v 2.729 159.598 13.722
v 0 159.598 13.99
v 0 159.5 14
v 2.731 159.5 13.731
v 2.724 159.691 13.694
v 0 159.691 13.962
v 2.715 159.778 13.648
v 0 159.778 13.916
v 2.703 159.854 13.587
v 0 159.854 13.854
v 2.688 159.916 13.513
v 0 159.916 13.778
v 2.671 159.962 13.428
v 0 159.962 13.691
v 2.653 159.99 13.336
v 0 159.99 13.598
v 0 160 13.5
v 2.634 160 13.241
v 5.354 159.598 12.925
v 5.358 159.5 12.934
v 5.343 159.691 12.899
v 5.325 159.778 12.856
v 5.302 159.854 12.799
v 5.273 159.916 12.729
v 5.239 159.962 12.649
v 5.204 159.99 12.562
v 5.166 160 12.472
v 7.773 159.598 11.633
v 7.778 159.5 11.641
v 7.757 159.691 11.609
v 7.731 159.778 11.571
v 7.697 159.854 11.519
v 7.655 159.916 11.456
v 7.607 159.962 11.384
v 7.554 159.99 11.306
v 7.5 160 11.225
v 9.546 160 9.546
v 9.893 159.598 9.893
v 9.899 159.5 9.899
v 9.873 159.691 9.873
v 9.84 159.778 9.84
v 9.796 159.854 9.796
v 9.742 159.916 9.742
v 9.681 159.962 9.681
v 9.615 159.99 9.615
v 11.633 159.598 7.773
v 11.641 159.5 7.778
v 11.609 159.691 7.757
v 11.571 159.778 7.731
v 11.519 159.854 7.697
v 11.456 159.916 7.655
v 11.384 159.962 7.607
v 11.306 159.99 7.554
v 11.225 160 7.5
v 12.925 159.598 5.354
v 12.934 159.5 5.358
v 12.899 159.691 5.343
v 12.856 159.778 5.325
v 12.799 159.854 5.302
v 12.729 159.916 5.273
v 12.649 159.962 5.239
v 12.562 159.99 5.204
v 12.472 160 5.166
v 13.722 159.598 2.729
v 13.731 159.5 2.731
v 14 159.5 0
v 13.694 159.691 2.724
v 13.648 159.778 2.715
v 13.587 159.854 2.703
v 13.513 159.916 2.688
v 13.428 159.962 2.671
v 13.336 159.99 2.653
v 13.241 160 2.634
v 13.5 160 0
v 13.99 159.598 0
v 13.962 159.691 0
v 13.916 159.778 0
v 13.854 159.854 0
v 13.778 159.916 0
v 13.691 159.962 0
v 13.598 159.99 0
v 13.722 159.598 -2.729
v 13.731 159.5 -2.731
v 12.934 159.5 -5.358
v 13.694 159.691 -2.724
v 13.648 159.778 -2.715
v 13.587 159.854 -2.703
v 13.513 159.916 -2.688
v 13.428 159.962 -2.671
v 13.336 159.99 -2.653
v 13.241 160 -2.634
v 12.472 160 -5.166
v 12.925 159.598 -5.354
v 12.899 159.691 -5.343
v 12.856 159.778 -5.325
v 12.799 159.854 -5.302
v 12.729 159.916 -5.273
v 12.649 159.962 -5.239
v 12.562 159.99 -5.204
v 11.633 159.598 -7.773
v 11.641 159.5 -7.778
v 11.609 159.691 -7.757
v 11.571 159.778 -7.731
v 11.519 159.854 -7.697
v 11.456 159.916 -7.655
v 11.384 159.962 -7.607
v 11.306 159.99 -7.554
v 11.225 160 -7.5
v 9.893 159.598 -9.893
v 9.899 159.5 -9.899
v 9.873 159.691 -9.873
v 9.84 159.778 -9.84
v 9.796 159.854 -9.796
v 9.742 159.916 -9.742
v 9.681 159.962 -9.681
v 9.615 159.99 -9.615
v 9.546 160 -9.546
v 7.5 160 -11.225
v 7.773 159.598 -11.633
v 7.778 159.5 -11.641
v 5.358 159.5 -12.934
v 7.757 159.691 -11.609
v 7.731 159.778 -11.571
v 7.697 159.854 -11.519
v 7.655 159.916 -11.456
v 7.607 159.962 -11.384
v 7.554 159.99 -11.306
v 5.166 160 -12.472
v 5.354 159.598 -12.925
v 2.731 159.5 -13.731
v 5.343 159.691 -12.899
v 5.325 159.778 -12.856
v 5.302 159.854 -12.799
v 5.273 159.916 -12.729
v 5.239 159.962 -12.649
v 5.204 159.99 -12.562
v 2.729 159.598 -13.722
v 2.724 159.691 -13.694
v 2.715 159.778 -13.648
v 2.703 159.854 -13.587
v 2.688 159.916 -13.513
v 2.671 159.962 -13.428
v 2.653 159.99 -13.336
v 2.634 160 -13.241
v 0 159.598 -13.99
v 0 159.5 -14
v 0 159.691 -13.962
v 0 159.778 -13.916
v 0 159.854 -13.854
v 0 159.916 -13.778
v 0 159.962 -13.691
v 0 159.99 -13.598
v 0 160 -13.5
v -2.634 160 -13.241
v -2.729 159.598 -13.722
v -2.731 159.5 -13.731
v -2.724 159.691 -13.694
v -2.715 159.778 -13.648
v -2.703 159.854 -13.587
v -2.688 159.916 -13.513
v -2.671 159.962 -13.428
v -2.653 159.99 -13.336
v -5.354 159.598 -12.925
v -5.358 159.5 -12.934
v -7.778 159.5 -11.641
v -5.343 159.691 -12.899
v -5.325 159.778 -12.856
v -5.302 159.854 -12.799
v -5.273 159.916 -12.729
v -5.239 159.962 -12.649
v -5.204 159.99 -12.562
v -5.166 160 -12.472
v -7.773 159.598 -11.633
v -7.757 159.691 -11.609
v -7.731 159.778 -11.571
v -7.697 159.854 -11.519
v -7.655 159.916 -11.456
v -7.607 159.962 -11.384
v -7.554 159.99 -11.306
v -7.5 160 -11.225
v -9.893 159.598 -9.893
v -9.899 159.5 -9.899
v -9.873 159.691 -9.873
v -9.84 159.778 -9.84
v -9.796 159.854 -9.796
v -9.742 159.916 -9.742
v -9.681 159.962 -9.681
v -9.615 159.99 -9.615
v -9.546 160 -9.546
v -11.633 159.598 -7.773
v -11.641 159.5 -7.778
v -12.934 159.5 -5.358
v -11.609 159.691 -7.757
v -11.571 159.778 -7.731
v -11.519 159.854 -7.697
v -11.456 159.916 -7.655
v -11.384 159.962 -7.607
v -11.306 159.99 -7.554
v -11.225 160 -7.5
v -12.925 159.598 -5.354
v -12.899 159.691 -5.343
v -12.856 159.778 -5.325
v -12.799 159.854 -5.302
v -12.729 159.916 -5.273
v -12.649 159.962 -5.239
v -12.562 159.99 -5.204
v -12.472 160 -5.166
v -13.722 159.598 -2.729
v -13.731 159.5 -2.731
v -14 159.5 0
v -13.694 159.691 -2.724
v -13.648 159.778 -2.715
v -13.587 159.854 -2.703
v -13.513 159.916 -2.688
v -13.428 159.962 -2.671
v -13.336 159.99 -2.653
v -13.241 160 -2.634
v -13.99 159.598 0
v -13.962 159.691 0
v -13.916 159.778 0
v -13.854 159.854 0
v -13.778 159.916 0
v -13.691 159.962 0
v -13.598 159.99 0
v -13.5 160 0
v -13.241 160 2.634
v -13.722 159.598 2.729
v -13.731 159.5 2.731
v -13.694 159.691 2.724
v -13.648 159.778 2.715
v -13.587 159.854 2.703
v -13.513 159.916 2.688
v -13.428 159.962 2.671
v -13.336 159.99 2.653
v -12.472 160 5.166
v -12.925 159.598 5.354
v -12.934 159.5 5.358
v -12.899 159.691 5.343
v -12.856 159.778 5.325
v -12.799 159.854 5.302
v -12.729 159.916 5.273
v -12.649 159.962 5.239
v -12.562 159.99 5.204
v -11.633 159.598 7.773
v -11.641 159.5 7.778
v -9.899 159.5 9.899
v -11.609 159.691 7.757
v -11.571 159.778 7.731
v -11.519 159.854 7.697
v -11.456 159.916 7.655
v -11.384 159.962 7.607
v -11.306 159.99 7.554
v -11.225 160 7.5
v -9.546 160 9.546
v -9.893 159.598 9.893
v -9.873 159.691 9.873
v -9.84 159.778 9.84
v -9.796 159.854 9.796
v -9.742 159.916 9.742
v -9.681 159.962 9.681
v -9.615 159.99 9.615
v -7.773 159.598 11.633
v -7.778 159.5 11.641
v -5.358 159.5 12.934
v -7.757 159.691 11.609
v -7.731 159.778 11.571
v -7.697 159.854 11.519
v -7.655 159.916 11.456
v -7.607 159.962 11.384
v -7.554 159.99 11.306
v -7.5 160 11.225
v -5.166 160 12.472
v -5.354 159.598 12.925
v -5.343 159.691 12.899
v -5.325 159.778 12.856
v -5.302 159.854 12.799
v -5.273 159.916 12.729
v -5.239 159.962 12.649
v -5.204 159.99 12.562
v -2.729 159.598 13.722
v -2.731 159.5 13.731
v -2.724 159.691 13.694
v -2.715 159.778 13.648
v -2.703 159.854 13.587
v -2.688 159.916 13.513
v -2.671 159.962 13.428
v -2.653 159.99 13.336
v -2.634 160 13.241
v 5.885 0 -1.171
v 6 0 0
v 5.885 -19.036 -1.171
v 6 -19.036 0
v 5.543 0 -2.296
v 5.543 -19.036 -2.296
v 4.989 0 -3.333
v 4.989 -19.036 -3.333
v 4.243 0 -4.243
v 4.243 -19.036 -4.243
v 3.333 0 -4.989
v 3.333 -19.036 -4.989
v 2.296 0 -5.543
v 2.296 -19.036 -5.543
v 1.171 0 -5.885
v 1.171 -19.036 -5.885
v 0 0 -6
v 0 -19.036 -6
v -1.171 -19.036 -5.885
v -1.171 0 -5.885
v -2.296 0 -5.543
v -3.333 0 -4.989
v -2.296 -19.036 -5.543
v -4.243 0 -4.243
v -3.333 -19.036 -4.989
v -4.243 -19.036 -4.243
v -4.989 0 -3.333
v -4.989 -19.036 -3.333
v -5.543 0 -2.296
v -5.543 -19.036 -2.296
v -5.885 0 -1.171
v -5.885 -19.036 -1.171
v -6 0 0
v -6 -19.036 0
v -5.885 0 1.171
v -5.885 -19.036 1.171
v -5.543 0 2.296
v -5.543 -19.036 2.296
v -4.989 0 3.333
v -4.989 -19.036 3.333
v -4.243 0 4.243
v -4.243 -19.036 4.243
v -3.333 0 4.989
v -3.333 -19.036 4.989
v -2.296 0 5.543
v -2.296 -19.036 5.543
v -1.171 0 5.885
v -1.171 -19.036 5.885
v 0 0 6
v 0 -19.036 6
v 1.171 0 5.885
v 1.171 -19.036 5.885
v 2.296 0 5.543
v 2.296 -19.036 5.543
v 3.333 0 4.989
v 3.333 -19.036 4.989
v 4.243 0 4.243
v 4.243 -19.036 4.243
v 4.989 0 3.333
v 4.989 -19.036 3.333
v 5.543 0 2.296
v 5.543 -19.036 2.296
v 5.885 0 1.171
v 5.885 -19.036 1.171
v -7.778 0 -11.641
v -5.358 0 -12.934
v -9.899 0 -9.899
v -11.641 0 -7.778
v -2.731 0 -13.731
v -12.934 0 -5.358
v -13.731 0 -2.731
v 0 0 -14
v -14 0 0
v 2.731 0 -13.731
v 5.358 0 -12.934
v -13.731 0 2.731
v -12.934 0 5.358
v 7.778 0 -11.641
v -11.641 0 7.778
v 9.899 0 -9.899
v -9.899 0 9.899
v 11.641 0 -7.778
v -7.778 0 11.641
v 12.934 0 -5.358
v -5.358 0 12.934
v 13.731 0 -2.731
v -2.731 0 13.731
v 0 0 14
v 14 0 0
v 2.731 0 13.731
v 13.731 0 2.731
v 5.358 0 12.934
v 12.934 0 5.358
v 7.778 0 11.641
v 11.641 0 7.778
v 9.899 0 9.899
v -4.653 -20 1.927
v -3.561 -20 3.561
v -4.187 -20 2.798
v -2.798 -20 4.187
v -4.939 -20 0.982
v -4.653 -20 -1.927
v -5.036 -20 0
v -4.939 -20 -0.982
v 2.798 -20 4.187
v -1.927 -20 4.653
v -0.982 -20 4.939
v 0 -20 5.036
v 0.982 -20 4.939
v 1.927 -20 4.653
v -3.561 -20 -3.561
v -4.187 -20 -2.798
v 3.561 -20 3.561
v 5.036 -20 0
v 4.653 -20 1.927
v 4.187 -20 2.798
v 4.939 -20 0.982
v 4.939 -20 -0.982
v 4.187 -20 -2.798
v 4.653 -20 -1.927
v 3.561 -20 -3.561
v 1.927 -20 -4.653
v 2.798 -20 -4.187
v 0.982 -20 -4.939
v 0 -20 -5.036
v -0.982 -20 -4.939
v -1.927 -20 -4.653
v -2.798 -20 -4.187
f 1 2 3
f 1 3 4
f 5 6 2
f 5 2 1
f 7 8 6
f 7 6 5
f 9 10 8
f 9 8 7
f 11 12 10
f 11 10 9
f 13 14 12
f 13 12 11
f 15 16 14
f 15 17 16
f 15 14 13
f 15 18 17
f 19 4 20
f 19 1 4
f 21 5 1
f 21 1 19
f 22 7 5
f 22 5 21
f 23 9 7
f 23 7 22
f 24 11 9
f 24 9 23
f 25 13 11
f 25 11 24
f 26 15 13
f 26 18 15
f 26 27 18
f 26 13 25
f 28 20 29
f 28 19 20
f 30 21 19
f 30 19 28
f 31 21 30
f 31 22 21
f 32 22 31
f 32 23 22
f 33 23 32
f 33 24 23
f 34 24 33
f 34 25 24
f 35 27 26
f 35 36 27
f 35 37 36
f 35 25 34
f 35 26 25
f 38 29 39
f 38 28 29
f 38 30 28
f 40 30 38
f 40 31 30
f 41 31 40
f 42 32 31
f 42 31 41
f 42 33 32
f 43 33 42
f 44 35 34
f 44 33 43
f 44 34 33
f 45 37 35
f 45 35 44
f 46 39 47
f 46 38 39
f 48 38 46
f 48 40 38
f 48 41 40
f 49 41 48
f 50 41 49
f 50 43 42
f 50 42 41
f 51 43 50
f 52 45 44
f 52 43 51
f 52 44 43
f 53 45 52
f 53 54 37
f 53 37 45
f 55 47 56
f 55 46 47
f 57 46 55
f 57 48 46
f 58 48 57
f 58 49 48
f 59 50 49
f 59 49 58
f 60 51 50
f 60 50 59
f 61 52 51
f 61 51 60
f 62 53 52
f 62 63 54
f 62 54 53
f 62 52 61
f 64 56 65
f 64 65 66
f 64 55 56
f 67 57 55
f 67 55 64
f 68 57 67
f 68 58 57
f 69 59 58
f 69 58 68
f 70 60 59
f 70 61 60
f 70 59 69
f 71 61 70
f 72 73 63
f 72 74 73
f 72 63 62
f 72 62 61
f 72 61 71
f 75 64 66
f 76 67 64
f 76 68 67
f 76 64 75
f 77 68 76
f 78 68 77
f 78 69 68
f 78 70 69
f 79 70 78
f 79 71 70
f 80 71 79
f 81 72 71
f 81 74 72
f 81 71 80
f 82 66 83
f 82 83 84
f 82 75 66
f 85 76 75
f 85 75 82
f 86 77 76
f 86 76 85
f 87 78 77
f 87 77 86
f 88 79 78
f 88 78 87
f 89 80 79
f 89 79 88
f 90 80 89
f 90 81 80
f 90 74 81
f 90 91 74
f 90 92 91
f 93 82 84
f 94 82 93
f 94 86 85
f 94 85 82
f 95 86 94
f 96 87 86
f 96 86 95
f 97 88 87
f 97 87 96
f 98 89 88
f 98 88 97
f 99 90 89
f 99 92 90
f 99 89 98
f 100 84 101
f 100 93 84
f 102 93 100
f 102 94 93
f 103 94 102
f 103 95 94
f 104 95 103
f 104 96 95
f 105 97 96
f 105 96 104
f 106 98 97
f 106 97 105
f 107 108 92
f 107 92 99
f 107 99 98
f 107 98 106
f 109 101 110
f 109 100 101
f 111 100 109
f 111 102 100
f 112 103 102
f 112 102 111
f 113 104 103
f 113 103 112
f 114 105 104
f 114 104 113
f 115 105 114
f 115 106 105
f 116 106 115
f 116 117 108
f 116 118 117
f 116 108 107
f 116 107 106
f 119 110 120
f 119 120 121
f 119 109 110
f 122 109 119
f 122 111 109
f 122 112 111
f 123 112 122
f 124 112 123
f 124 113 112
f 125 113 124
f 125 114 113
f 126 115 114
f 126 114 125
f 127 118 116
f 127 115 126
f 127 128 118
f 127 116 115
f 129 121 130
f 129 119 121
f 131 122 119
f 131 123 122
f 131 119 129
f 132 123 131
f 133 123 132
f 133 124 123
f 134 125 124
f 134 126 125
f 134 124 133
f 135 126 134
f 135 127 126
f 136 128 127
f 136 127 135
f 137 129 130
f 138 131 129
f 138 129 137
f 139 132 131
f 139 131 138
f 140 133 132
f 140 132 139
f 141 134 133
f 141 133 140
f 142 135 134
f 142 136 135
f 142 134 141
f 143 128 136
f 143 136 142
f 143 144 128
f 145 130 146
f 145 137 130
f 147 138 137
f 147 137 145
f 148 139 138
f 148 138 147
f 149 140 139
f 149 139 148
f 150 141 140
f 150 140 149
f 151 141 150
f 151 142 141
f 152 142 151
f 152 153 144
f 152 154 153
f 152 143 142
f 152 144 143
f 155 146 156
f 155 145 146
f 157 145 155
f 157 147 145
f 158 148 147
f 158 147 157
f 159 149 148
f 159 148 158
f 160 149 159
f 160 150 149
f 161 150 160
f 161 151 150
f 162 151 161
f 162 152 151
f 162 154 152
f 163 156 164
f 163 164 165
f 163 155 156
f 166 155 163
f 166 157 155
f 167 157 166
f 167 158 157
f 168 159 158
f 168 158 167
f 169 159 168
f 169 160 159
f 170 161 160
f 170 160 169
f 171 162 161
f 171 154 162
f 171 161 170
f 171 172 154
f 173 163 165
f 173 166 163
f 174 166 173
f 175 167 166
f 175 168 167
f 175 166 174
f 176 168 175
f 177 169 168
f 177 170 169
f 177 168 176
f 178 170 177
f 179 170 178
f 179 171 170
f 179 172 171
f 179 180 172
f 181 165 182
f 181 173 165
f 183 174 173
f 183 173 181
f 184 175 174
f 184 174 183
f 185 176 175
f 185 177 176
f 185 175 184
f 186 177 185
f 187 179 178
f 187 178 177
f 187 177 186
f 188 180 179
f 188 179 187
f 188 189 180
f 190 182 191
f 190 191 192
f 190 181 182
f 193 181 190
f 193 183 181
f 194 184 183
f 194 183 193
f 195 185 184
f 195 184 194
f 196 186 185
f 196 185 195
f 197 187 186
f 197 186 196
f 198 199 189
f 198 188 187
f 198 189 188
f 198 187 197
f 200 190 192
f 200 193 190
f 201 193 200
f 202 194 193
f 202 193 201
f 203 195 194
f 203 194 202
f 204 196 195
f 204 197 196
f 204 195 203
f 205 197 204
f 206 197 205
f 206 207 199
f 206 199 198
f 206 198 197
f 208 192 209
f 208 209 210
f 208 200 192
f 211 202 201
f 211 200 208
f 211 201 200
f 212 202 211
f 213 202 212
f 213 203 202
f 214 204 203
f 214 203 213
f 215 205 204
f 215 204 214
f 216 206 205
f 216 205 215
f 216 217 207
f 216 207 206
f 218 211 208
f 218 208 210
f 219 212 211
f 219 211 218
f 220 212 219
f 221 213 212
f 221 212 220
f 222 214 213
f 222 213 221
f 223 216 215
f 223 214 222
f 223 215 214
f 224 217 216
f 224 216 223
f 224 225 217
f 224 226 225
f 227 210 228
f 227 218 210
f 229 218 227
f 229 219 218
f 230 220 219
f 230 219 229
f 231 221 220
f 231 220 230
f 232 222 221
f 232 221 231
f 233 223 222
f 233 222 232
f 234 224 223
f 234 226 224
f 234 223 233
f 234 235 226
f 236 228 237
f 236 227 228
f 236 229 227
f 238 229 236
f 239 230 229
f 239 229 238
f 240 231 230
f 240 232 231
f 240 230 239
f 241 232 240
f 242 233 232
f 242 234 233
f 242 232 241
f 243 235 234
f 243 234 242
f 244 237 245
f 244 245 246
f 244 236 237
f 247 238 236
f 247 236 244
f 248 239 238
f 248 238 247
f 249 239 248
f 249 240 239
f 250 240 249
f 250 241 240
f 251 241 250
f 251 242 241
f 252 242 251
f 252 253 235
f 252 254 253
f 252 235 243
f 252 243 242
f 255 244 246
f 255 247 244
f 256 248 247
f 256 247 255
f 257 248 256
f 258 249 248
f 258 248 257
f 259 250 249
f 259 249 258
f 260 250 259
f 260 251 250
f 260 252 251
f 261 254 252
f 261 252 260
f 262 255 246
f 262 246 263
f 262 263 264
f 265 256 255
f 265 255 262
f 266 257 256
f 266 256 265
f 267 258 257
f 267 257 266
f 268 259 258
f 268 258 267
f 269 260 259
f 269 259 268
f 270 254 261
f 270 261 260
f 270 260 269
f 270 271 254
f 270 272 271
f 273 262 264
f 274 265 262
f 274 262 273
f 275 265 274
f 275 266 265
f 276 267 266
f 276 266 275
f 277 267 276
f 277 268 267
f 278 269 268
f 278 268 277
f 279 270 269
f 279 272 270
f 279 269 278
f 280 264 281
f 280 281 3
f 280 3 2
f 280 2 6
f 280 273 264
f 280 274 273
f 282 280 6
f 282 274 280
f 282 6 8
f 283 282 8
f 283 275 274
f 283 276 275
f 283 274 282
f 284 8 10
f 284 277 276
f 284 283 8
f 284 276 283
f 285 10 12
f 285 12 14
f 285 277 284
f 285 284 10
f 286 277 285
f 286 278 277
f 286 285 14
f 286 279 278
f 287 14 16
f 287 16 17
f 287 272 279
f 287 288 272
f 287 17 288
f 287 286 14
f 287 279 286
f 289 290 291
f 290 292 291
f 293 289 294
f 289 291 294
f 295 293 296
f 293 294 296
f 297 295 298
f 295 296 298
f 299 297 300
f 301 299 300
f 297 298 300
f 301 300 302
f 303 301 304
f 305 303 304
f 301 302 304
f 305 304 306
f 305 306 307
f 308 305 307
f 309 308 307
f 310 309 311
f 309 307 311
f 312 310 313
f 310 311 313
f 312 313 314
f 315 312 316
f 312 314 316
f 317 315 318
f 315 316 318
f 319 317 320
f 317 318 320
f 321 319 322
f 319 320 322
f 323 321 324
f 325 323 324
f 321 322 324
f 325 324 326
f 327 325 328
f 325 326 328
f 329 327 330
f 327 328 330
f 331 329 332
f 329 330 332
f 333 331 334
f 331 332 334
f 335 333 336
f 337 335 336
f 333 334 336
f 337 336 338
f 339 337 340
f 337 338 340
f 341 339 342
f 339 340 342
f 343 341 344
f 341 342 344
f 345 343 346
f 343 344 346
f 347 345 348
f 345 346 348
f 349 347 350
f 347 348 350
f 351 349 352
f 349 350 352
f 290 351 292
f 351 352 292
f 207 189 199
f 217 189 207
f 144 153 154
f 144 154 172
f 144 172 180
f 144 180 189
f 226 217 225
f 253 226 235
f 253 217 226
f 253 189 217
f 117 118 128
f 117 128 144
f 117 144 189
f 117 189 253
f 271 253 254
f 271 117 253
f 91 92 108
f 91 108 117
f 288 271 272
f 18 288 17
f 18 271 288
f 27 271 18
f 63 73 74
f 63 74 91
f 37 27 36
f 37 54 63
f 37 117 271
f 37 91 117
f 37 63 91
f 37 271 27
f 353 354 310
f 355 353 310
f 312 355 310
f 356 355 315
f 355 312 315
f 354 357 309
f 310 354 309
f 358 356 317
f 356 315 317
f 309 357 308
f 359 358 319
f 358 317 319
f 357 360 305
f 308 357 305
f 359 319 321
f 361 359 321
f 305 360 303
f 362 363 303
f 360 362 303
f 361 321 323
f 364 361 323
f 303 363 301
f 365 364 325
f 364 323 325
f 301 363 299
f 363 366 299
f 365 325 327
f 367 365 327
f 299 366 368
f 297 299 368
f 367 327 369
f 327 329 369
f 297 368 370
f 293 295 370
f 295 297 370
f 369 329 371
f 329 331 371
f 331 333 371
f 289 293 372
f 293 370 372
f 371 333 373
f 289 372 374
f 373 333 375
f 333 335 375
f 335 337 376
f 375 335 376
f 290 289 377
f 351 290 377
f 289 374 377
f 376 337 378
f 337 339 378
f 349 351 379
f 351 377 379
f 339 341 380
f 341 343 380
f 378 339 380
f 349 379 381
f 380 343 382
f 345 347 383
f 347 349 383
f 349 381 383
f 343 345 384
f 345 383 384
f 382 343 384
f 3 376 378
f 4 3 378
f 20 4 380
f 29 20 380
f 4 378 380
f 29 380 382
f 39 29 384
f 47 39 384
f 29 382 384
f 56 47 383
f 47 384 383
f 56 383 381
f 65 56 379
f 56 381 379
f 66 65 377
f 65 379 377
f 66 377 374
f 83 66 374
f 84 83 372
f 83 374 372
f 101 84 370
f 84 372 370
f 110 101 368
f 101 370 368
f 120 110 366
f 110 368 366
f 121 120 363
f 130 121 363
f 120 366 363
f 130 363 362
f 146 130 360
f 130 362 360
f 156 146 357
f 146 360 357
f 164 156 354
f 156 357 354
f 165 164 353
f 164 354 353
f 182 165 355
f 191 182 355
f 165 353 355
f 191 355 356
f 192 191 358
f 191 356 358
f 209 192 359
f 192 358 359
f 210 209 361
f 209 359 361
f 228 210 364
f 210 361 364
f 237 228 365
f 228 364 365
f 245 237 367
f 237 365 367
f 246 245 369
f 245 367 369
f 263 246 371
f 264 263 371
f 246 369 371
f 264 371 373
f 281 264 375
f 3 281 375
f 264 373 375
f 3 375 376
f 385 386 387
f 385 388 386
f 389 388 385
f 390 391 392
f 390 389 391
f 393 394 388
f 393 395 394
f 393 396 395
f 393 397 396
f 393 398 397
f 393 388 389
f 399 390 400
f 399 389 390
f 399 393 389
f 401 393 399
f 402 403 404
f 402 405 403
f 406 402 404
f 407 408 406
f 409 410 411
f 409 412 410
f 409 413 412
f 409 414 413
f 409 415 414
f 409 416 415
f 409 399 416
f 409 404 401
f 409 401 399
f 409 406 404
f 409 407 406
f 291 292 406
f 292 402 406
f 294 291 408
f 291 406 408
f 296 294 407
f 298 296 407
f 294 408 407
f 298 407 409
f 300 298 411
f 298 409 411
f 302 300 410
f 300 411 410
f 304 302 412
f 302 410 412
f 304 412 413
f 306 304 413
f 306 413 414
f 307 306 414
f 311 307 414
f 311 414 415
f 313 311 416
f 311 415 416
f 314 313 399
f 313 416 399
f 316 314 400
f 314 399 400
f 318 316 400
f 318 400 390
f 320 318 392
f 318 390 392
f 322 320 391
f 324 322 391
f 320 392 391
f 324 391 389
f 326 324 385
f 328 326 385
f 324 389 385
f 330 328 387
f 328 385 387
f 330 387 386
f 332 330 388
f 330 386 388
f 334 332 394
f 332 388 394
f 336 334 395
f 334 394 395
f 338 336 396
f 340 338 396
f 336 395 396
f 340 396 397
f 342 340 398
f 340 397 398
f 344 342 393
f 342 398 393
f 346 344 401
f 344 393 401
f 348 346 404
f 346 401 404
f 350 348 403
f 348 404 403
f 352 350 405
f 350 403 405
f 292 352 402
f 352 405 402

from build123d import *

# Parameters (mm, degrees)
SKETCH1_R           = 14
BOSS_EXTRUDE1_DEPTH = 160
SKETCH2_R           = 10
BOSS_EXTRUDE2_DEPTH = 20
FILLET1_R           = 0.5


# Read off the part's stored shape, not the designer's step: M12 Machine Threads Stud1
with BuildPart() as part:
    # Sketch1 → Boss-Extrude1 (new body)
    with BuildSketch(Plane(origin=(0, 0, 0), x_dir=(1, 0, 0), z_dir=(0, 1, 0))):
        with Locations(Location((0, 0, 0), (0, 0, 270))):
            Circle(SKETCH1_R)
    extrude(amount=BOSS_EXTRUDE1_DEPTH)

    # Sketch2 → Boss-Extrude2 (add)
    with BuildSketch(Plane.XZ):
        with Locations(Location((0, 0, 0), (0, 0, 270))):
            Circle(SKETCH2_R)
    extrude(amount=BOSS_EXTRUDE2_DEPTH)

    # M12 Machine Threads Stud1 outline → M12 Machine Threads Stud1 (revolve, cut)
    with BuildSketch(Plane.XY):
        Polygon((10, 0), (6, 0), (6, -19.036), (5.036, -20), (10, -20), align=None)
    revolve(axis=Axis((0, 0, 0), (0, 1, 0)), mode=Mode.SUBTRACT)

    # Fillet1
    fillet1_edges = [part.edges().sort_by_distance(p)[0] for p in [
        (0, 160, -14),
    ]]
    fillet(fillet1_edges, radius=FILLET1_R)


solid = part.part
